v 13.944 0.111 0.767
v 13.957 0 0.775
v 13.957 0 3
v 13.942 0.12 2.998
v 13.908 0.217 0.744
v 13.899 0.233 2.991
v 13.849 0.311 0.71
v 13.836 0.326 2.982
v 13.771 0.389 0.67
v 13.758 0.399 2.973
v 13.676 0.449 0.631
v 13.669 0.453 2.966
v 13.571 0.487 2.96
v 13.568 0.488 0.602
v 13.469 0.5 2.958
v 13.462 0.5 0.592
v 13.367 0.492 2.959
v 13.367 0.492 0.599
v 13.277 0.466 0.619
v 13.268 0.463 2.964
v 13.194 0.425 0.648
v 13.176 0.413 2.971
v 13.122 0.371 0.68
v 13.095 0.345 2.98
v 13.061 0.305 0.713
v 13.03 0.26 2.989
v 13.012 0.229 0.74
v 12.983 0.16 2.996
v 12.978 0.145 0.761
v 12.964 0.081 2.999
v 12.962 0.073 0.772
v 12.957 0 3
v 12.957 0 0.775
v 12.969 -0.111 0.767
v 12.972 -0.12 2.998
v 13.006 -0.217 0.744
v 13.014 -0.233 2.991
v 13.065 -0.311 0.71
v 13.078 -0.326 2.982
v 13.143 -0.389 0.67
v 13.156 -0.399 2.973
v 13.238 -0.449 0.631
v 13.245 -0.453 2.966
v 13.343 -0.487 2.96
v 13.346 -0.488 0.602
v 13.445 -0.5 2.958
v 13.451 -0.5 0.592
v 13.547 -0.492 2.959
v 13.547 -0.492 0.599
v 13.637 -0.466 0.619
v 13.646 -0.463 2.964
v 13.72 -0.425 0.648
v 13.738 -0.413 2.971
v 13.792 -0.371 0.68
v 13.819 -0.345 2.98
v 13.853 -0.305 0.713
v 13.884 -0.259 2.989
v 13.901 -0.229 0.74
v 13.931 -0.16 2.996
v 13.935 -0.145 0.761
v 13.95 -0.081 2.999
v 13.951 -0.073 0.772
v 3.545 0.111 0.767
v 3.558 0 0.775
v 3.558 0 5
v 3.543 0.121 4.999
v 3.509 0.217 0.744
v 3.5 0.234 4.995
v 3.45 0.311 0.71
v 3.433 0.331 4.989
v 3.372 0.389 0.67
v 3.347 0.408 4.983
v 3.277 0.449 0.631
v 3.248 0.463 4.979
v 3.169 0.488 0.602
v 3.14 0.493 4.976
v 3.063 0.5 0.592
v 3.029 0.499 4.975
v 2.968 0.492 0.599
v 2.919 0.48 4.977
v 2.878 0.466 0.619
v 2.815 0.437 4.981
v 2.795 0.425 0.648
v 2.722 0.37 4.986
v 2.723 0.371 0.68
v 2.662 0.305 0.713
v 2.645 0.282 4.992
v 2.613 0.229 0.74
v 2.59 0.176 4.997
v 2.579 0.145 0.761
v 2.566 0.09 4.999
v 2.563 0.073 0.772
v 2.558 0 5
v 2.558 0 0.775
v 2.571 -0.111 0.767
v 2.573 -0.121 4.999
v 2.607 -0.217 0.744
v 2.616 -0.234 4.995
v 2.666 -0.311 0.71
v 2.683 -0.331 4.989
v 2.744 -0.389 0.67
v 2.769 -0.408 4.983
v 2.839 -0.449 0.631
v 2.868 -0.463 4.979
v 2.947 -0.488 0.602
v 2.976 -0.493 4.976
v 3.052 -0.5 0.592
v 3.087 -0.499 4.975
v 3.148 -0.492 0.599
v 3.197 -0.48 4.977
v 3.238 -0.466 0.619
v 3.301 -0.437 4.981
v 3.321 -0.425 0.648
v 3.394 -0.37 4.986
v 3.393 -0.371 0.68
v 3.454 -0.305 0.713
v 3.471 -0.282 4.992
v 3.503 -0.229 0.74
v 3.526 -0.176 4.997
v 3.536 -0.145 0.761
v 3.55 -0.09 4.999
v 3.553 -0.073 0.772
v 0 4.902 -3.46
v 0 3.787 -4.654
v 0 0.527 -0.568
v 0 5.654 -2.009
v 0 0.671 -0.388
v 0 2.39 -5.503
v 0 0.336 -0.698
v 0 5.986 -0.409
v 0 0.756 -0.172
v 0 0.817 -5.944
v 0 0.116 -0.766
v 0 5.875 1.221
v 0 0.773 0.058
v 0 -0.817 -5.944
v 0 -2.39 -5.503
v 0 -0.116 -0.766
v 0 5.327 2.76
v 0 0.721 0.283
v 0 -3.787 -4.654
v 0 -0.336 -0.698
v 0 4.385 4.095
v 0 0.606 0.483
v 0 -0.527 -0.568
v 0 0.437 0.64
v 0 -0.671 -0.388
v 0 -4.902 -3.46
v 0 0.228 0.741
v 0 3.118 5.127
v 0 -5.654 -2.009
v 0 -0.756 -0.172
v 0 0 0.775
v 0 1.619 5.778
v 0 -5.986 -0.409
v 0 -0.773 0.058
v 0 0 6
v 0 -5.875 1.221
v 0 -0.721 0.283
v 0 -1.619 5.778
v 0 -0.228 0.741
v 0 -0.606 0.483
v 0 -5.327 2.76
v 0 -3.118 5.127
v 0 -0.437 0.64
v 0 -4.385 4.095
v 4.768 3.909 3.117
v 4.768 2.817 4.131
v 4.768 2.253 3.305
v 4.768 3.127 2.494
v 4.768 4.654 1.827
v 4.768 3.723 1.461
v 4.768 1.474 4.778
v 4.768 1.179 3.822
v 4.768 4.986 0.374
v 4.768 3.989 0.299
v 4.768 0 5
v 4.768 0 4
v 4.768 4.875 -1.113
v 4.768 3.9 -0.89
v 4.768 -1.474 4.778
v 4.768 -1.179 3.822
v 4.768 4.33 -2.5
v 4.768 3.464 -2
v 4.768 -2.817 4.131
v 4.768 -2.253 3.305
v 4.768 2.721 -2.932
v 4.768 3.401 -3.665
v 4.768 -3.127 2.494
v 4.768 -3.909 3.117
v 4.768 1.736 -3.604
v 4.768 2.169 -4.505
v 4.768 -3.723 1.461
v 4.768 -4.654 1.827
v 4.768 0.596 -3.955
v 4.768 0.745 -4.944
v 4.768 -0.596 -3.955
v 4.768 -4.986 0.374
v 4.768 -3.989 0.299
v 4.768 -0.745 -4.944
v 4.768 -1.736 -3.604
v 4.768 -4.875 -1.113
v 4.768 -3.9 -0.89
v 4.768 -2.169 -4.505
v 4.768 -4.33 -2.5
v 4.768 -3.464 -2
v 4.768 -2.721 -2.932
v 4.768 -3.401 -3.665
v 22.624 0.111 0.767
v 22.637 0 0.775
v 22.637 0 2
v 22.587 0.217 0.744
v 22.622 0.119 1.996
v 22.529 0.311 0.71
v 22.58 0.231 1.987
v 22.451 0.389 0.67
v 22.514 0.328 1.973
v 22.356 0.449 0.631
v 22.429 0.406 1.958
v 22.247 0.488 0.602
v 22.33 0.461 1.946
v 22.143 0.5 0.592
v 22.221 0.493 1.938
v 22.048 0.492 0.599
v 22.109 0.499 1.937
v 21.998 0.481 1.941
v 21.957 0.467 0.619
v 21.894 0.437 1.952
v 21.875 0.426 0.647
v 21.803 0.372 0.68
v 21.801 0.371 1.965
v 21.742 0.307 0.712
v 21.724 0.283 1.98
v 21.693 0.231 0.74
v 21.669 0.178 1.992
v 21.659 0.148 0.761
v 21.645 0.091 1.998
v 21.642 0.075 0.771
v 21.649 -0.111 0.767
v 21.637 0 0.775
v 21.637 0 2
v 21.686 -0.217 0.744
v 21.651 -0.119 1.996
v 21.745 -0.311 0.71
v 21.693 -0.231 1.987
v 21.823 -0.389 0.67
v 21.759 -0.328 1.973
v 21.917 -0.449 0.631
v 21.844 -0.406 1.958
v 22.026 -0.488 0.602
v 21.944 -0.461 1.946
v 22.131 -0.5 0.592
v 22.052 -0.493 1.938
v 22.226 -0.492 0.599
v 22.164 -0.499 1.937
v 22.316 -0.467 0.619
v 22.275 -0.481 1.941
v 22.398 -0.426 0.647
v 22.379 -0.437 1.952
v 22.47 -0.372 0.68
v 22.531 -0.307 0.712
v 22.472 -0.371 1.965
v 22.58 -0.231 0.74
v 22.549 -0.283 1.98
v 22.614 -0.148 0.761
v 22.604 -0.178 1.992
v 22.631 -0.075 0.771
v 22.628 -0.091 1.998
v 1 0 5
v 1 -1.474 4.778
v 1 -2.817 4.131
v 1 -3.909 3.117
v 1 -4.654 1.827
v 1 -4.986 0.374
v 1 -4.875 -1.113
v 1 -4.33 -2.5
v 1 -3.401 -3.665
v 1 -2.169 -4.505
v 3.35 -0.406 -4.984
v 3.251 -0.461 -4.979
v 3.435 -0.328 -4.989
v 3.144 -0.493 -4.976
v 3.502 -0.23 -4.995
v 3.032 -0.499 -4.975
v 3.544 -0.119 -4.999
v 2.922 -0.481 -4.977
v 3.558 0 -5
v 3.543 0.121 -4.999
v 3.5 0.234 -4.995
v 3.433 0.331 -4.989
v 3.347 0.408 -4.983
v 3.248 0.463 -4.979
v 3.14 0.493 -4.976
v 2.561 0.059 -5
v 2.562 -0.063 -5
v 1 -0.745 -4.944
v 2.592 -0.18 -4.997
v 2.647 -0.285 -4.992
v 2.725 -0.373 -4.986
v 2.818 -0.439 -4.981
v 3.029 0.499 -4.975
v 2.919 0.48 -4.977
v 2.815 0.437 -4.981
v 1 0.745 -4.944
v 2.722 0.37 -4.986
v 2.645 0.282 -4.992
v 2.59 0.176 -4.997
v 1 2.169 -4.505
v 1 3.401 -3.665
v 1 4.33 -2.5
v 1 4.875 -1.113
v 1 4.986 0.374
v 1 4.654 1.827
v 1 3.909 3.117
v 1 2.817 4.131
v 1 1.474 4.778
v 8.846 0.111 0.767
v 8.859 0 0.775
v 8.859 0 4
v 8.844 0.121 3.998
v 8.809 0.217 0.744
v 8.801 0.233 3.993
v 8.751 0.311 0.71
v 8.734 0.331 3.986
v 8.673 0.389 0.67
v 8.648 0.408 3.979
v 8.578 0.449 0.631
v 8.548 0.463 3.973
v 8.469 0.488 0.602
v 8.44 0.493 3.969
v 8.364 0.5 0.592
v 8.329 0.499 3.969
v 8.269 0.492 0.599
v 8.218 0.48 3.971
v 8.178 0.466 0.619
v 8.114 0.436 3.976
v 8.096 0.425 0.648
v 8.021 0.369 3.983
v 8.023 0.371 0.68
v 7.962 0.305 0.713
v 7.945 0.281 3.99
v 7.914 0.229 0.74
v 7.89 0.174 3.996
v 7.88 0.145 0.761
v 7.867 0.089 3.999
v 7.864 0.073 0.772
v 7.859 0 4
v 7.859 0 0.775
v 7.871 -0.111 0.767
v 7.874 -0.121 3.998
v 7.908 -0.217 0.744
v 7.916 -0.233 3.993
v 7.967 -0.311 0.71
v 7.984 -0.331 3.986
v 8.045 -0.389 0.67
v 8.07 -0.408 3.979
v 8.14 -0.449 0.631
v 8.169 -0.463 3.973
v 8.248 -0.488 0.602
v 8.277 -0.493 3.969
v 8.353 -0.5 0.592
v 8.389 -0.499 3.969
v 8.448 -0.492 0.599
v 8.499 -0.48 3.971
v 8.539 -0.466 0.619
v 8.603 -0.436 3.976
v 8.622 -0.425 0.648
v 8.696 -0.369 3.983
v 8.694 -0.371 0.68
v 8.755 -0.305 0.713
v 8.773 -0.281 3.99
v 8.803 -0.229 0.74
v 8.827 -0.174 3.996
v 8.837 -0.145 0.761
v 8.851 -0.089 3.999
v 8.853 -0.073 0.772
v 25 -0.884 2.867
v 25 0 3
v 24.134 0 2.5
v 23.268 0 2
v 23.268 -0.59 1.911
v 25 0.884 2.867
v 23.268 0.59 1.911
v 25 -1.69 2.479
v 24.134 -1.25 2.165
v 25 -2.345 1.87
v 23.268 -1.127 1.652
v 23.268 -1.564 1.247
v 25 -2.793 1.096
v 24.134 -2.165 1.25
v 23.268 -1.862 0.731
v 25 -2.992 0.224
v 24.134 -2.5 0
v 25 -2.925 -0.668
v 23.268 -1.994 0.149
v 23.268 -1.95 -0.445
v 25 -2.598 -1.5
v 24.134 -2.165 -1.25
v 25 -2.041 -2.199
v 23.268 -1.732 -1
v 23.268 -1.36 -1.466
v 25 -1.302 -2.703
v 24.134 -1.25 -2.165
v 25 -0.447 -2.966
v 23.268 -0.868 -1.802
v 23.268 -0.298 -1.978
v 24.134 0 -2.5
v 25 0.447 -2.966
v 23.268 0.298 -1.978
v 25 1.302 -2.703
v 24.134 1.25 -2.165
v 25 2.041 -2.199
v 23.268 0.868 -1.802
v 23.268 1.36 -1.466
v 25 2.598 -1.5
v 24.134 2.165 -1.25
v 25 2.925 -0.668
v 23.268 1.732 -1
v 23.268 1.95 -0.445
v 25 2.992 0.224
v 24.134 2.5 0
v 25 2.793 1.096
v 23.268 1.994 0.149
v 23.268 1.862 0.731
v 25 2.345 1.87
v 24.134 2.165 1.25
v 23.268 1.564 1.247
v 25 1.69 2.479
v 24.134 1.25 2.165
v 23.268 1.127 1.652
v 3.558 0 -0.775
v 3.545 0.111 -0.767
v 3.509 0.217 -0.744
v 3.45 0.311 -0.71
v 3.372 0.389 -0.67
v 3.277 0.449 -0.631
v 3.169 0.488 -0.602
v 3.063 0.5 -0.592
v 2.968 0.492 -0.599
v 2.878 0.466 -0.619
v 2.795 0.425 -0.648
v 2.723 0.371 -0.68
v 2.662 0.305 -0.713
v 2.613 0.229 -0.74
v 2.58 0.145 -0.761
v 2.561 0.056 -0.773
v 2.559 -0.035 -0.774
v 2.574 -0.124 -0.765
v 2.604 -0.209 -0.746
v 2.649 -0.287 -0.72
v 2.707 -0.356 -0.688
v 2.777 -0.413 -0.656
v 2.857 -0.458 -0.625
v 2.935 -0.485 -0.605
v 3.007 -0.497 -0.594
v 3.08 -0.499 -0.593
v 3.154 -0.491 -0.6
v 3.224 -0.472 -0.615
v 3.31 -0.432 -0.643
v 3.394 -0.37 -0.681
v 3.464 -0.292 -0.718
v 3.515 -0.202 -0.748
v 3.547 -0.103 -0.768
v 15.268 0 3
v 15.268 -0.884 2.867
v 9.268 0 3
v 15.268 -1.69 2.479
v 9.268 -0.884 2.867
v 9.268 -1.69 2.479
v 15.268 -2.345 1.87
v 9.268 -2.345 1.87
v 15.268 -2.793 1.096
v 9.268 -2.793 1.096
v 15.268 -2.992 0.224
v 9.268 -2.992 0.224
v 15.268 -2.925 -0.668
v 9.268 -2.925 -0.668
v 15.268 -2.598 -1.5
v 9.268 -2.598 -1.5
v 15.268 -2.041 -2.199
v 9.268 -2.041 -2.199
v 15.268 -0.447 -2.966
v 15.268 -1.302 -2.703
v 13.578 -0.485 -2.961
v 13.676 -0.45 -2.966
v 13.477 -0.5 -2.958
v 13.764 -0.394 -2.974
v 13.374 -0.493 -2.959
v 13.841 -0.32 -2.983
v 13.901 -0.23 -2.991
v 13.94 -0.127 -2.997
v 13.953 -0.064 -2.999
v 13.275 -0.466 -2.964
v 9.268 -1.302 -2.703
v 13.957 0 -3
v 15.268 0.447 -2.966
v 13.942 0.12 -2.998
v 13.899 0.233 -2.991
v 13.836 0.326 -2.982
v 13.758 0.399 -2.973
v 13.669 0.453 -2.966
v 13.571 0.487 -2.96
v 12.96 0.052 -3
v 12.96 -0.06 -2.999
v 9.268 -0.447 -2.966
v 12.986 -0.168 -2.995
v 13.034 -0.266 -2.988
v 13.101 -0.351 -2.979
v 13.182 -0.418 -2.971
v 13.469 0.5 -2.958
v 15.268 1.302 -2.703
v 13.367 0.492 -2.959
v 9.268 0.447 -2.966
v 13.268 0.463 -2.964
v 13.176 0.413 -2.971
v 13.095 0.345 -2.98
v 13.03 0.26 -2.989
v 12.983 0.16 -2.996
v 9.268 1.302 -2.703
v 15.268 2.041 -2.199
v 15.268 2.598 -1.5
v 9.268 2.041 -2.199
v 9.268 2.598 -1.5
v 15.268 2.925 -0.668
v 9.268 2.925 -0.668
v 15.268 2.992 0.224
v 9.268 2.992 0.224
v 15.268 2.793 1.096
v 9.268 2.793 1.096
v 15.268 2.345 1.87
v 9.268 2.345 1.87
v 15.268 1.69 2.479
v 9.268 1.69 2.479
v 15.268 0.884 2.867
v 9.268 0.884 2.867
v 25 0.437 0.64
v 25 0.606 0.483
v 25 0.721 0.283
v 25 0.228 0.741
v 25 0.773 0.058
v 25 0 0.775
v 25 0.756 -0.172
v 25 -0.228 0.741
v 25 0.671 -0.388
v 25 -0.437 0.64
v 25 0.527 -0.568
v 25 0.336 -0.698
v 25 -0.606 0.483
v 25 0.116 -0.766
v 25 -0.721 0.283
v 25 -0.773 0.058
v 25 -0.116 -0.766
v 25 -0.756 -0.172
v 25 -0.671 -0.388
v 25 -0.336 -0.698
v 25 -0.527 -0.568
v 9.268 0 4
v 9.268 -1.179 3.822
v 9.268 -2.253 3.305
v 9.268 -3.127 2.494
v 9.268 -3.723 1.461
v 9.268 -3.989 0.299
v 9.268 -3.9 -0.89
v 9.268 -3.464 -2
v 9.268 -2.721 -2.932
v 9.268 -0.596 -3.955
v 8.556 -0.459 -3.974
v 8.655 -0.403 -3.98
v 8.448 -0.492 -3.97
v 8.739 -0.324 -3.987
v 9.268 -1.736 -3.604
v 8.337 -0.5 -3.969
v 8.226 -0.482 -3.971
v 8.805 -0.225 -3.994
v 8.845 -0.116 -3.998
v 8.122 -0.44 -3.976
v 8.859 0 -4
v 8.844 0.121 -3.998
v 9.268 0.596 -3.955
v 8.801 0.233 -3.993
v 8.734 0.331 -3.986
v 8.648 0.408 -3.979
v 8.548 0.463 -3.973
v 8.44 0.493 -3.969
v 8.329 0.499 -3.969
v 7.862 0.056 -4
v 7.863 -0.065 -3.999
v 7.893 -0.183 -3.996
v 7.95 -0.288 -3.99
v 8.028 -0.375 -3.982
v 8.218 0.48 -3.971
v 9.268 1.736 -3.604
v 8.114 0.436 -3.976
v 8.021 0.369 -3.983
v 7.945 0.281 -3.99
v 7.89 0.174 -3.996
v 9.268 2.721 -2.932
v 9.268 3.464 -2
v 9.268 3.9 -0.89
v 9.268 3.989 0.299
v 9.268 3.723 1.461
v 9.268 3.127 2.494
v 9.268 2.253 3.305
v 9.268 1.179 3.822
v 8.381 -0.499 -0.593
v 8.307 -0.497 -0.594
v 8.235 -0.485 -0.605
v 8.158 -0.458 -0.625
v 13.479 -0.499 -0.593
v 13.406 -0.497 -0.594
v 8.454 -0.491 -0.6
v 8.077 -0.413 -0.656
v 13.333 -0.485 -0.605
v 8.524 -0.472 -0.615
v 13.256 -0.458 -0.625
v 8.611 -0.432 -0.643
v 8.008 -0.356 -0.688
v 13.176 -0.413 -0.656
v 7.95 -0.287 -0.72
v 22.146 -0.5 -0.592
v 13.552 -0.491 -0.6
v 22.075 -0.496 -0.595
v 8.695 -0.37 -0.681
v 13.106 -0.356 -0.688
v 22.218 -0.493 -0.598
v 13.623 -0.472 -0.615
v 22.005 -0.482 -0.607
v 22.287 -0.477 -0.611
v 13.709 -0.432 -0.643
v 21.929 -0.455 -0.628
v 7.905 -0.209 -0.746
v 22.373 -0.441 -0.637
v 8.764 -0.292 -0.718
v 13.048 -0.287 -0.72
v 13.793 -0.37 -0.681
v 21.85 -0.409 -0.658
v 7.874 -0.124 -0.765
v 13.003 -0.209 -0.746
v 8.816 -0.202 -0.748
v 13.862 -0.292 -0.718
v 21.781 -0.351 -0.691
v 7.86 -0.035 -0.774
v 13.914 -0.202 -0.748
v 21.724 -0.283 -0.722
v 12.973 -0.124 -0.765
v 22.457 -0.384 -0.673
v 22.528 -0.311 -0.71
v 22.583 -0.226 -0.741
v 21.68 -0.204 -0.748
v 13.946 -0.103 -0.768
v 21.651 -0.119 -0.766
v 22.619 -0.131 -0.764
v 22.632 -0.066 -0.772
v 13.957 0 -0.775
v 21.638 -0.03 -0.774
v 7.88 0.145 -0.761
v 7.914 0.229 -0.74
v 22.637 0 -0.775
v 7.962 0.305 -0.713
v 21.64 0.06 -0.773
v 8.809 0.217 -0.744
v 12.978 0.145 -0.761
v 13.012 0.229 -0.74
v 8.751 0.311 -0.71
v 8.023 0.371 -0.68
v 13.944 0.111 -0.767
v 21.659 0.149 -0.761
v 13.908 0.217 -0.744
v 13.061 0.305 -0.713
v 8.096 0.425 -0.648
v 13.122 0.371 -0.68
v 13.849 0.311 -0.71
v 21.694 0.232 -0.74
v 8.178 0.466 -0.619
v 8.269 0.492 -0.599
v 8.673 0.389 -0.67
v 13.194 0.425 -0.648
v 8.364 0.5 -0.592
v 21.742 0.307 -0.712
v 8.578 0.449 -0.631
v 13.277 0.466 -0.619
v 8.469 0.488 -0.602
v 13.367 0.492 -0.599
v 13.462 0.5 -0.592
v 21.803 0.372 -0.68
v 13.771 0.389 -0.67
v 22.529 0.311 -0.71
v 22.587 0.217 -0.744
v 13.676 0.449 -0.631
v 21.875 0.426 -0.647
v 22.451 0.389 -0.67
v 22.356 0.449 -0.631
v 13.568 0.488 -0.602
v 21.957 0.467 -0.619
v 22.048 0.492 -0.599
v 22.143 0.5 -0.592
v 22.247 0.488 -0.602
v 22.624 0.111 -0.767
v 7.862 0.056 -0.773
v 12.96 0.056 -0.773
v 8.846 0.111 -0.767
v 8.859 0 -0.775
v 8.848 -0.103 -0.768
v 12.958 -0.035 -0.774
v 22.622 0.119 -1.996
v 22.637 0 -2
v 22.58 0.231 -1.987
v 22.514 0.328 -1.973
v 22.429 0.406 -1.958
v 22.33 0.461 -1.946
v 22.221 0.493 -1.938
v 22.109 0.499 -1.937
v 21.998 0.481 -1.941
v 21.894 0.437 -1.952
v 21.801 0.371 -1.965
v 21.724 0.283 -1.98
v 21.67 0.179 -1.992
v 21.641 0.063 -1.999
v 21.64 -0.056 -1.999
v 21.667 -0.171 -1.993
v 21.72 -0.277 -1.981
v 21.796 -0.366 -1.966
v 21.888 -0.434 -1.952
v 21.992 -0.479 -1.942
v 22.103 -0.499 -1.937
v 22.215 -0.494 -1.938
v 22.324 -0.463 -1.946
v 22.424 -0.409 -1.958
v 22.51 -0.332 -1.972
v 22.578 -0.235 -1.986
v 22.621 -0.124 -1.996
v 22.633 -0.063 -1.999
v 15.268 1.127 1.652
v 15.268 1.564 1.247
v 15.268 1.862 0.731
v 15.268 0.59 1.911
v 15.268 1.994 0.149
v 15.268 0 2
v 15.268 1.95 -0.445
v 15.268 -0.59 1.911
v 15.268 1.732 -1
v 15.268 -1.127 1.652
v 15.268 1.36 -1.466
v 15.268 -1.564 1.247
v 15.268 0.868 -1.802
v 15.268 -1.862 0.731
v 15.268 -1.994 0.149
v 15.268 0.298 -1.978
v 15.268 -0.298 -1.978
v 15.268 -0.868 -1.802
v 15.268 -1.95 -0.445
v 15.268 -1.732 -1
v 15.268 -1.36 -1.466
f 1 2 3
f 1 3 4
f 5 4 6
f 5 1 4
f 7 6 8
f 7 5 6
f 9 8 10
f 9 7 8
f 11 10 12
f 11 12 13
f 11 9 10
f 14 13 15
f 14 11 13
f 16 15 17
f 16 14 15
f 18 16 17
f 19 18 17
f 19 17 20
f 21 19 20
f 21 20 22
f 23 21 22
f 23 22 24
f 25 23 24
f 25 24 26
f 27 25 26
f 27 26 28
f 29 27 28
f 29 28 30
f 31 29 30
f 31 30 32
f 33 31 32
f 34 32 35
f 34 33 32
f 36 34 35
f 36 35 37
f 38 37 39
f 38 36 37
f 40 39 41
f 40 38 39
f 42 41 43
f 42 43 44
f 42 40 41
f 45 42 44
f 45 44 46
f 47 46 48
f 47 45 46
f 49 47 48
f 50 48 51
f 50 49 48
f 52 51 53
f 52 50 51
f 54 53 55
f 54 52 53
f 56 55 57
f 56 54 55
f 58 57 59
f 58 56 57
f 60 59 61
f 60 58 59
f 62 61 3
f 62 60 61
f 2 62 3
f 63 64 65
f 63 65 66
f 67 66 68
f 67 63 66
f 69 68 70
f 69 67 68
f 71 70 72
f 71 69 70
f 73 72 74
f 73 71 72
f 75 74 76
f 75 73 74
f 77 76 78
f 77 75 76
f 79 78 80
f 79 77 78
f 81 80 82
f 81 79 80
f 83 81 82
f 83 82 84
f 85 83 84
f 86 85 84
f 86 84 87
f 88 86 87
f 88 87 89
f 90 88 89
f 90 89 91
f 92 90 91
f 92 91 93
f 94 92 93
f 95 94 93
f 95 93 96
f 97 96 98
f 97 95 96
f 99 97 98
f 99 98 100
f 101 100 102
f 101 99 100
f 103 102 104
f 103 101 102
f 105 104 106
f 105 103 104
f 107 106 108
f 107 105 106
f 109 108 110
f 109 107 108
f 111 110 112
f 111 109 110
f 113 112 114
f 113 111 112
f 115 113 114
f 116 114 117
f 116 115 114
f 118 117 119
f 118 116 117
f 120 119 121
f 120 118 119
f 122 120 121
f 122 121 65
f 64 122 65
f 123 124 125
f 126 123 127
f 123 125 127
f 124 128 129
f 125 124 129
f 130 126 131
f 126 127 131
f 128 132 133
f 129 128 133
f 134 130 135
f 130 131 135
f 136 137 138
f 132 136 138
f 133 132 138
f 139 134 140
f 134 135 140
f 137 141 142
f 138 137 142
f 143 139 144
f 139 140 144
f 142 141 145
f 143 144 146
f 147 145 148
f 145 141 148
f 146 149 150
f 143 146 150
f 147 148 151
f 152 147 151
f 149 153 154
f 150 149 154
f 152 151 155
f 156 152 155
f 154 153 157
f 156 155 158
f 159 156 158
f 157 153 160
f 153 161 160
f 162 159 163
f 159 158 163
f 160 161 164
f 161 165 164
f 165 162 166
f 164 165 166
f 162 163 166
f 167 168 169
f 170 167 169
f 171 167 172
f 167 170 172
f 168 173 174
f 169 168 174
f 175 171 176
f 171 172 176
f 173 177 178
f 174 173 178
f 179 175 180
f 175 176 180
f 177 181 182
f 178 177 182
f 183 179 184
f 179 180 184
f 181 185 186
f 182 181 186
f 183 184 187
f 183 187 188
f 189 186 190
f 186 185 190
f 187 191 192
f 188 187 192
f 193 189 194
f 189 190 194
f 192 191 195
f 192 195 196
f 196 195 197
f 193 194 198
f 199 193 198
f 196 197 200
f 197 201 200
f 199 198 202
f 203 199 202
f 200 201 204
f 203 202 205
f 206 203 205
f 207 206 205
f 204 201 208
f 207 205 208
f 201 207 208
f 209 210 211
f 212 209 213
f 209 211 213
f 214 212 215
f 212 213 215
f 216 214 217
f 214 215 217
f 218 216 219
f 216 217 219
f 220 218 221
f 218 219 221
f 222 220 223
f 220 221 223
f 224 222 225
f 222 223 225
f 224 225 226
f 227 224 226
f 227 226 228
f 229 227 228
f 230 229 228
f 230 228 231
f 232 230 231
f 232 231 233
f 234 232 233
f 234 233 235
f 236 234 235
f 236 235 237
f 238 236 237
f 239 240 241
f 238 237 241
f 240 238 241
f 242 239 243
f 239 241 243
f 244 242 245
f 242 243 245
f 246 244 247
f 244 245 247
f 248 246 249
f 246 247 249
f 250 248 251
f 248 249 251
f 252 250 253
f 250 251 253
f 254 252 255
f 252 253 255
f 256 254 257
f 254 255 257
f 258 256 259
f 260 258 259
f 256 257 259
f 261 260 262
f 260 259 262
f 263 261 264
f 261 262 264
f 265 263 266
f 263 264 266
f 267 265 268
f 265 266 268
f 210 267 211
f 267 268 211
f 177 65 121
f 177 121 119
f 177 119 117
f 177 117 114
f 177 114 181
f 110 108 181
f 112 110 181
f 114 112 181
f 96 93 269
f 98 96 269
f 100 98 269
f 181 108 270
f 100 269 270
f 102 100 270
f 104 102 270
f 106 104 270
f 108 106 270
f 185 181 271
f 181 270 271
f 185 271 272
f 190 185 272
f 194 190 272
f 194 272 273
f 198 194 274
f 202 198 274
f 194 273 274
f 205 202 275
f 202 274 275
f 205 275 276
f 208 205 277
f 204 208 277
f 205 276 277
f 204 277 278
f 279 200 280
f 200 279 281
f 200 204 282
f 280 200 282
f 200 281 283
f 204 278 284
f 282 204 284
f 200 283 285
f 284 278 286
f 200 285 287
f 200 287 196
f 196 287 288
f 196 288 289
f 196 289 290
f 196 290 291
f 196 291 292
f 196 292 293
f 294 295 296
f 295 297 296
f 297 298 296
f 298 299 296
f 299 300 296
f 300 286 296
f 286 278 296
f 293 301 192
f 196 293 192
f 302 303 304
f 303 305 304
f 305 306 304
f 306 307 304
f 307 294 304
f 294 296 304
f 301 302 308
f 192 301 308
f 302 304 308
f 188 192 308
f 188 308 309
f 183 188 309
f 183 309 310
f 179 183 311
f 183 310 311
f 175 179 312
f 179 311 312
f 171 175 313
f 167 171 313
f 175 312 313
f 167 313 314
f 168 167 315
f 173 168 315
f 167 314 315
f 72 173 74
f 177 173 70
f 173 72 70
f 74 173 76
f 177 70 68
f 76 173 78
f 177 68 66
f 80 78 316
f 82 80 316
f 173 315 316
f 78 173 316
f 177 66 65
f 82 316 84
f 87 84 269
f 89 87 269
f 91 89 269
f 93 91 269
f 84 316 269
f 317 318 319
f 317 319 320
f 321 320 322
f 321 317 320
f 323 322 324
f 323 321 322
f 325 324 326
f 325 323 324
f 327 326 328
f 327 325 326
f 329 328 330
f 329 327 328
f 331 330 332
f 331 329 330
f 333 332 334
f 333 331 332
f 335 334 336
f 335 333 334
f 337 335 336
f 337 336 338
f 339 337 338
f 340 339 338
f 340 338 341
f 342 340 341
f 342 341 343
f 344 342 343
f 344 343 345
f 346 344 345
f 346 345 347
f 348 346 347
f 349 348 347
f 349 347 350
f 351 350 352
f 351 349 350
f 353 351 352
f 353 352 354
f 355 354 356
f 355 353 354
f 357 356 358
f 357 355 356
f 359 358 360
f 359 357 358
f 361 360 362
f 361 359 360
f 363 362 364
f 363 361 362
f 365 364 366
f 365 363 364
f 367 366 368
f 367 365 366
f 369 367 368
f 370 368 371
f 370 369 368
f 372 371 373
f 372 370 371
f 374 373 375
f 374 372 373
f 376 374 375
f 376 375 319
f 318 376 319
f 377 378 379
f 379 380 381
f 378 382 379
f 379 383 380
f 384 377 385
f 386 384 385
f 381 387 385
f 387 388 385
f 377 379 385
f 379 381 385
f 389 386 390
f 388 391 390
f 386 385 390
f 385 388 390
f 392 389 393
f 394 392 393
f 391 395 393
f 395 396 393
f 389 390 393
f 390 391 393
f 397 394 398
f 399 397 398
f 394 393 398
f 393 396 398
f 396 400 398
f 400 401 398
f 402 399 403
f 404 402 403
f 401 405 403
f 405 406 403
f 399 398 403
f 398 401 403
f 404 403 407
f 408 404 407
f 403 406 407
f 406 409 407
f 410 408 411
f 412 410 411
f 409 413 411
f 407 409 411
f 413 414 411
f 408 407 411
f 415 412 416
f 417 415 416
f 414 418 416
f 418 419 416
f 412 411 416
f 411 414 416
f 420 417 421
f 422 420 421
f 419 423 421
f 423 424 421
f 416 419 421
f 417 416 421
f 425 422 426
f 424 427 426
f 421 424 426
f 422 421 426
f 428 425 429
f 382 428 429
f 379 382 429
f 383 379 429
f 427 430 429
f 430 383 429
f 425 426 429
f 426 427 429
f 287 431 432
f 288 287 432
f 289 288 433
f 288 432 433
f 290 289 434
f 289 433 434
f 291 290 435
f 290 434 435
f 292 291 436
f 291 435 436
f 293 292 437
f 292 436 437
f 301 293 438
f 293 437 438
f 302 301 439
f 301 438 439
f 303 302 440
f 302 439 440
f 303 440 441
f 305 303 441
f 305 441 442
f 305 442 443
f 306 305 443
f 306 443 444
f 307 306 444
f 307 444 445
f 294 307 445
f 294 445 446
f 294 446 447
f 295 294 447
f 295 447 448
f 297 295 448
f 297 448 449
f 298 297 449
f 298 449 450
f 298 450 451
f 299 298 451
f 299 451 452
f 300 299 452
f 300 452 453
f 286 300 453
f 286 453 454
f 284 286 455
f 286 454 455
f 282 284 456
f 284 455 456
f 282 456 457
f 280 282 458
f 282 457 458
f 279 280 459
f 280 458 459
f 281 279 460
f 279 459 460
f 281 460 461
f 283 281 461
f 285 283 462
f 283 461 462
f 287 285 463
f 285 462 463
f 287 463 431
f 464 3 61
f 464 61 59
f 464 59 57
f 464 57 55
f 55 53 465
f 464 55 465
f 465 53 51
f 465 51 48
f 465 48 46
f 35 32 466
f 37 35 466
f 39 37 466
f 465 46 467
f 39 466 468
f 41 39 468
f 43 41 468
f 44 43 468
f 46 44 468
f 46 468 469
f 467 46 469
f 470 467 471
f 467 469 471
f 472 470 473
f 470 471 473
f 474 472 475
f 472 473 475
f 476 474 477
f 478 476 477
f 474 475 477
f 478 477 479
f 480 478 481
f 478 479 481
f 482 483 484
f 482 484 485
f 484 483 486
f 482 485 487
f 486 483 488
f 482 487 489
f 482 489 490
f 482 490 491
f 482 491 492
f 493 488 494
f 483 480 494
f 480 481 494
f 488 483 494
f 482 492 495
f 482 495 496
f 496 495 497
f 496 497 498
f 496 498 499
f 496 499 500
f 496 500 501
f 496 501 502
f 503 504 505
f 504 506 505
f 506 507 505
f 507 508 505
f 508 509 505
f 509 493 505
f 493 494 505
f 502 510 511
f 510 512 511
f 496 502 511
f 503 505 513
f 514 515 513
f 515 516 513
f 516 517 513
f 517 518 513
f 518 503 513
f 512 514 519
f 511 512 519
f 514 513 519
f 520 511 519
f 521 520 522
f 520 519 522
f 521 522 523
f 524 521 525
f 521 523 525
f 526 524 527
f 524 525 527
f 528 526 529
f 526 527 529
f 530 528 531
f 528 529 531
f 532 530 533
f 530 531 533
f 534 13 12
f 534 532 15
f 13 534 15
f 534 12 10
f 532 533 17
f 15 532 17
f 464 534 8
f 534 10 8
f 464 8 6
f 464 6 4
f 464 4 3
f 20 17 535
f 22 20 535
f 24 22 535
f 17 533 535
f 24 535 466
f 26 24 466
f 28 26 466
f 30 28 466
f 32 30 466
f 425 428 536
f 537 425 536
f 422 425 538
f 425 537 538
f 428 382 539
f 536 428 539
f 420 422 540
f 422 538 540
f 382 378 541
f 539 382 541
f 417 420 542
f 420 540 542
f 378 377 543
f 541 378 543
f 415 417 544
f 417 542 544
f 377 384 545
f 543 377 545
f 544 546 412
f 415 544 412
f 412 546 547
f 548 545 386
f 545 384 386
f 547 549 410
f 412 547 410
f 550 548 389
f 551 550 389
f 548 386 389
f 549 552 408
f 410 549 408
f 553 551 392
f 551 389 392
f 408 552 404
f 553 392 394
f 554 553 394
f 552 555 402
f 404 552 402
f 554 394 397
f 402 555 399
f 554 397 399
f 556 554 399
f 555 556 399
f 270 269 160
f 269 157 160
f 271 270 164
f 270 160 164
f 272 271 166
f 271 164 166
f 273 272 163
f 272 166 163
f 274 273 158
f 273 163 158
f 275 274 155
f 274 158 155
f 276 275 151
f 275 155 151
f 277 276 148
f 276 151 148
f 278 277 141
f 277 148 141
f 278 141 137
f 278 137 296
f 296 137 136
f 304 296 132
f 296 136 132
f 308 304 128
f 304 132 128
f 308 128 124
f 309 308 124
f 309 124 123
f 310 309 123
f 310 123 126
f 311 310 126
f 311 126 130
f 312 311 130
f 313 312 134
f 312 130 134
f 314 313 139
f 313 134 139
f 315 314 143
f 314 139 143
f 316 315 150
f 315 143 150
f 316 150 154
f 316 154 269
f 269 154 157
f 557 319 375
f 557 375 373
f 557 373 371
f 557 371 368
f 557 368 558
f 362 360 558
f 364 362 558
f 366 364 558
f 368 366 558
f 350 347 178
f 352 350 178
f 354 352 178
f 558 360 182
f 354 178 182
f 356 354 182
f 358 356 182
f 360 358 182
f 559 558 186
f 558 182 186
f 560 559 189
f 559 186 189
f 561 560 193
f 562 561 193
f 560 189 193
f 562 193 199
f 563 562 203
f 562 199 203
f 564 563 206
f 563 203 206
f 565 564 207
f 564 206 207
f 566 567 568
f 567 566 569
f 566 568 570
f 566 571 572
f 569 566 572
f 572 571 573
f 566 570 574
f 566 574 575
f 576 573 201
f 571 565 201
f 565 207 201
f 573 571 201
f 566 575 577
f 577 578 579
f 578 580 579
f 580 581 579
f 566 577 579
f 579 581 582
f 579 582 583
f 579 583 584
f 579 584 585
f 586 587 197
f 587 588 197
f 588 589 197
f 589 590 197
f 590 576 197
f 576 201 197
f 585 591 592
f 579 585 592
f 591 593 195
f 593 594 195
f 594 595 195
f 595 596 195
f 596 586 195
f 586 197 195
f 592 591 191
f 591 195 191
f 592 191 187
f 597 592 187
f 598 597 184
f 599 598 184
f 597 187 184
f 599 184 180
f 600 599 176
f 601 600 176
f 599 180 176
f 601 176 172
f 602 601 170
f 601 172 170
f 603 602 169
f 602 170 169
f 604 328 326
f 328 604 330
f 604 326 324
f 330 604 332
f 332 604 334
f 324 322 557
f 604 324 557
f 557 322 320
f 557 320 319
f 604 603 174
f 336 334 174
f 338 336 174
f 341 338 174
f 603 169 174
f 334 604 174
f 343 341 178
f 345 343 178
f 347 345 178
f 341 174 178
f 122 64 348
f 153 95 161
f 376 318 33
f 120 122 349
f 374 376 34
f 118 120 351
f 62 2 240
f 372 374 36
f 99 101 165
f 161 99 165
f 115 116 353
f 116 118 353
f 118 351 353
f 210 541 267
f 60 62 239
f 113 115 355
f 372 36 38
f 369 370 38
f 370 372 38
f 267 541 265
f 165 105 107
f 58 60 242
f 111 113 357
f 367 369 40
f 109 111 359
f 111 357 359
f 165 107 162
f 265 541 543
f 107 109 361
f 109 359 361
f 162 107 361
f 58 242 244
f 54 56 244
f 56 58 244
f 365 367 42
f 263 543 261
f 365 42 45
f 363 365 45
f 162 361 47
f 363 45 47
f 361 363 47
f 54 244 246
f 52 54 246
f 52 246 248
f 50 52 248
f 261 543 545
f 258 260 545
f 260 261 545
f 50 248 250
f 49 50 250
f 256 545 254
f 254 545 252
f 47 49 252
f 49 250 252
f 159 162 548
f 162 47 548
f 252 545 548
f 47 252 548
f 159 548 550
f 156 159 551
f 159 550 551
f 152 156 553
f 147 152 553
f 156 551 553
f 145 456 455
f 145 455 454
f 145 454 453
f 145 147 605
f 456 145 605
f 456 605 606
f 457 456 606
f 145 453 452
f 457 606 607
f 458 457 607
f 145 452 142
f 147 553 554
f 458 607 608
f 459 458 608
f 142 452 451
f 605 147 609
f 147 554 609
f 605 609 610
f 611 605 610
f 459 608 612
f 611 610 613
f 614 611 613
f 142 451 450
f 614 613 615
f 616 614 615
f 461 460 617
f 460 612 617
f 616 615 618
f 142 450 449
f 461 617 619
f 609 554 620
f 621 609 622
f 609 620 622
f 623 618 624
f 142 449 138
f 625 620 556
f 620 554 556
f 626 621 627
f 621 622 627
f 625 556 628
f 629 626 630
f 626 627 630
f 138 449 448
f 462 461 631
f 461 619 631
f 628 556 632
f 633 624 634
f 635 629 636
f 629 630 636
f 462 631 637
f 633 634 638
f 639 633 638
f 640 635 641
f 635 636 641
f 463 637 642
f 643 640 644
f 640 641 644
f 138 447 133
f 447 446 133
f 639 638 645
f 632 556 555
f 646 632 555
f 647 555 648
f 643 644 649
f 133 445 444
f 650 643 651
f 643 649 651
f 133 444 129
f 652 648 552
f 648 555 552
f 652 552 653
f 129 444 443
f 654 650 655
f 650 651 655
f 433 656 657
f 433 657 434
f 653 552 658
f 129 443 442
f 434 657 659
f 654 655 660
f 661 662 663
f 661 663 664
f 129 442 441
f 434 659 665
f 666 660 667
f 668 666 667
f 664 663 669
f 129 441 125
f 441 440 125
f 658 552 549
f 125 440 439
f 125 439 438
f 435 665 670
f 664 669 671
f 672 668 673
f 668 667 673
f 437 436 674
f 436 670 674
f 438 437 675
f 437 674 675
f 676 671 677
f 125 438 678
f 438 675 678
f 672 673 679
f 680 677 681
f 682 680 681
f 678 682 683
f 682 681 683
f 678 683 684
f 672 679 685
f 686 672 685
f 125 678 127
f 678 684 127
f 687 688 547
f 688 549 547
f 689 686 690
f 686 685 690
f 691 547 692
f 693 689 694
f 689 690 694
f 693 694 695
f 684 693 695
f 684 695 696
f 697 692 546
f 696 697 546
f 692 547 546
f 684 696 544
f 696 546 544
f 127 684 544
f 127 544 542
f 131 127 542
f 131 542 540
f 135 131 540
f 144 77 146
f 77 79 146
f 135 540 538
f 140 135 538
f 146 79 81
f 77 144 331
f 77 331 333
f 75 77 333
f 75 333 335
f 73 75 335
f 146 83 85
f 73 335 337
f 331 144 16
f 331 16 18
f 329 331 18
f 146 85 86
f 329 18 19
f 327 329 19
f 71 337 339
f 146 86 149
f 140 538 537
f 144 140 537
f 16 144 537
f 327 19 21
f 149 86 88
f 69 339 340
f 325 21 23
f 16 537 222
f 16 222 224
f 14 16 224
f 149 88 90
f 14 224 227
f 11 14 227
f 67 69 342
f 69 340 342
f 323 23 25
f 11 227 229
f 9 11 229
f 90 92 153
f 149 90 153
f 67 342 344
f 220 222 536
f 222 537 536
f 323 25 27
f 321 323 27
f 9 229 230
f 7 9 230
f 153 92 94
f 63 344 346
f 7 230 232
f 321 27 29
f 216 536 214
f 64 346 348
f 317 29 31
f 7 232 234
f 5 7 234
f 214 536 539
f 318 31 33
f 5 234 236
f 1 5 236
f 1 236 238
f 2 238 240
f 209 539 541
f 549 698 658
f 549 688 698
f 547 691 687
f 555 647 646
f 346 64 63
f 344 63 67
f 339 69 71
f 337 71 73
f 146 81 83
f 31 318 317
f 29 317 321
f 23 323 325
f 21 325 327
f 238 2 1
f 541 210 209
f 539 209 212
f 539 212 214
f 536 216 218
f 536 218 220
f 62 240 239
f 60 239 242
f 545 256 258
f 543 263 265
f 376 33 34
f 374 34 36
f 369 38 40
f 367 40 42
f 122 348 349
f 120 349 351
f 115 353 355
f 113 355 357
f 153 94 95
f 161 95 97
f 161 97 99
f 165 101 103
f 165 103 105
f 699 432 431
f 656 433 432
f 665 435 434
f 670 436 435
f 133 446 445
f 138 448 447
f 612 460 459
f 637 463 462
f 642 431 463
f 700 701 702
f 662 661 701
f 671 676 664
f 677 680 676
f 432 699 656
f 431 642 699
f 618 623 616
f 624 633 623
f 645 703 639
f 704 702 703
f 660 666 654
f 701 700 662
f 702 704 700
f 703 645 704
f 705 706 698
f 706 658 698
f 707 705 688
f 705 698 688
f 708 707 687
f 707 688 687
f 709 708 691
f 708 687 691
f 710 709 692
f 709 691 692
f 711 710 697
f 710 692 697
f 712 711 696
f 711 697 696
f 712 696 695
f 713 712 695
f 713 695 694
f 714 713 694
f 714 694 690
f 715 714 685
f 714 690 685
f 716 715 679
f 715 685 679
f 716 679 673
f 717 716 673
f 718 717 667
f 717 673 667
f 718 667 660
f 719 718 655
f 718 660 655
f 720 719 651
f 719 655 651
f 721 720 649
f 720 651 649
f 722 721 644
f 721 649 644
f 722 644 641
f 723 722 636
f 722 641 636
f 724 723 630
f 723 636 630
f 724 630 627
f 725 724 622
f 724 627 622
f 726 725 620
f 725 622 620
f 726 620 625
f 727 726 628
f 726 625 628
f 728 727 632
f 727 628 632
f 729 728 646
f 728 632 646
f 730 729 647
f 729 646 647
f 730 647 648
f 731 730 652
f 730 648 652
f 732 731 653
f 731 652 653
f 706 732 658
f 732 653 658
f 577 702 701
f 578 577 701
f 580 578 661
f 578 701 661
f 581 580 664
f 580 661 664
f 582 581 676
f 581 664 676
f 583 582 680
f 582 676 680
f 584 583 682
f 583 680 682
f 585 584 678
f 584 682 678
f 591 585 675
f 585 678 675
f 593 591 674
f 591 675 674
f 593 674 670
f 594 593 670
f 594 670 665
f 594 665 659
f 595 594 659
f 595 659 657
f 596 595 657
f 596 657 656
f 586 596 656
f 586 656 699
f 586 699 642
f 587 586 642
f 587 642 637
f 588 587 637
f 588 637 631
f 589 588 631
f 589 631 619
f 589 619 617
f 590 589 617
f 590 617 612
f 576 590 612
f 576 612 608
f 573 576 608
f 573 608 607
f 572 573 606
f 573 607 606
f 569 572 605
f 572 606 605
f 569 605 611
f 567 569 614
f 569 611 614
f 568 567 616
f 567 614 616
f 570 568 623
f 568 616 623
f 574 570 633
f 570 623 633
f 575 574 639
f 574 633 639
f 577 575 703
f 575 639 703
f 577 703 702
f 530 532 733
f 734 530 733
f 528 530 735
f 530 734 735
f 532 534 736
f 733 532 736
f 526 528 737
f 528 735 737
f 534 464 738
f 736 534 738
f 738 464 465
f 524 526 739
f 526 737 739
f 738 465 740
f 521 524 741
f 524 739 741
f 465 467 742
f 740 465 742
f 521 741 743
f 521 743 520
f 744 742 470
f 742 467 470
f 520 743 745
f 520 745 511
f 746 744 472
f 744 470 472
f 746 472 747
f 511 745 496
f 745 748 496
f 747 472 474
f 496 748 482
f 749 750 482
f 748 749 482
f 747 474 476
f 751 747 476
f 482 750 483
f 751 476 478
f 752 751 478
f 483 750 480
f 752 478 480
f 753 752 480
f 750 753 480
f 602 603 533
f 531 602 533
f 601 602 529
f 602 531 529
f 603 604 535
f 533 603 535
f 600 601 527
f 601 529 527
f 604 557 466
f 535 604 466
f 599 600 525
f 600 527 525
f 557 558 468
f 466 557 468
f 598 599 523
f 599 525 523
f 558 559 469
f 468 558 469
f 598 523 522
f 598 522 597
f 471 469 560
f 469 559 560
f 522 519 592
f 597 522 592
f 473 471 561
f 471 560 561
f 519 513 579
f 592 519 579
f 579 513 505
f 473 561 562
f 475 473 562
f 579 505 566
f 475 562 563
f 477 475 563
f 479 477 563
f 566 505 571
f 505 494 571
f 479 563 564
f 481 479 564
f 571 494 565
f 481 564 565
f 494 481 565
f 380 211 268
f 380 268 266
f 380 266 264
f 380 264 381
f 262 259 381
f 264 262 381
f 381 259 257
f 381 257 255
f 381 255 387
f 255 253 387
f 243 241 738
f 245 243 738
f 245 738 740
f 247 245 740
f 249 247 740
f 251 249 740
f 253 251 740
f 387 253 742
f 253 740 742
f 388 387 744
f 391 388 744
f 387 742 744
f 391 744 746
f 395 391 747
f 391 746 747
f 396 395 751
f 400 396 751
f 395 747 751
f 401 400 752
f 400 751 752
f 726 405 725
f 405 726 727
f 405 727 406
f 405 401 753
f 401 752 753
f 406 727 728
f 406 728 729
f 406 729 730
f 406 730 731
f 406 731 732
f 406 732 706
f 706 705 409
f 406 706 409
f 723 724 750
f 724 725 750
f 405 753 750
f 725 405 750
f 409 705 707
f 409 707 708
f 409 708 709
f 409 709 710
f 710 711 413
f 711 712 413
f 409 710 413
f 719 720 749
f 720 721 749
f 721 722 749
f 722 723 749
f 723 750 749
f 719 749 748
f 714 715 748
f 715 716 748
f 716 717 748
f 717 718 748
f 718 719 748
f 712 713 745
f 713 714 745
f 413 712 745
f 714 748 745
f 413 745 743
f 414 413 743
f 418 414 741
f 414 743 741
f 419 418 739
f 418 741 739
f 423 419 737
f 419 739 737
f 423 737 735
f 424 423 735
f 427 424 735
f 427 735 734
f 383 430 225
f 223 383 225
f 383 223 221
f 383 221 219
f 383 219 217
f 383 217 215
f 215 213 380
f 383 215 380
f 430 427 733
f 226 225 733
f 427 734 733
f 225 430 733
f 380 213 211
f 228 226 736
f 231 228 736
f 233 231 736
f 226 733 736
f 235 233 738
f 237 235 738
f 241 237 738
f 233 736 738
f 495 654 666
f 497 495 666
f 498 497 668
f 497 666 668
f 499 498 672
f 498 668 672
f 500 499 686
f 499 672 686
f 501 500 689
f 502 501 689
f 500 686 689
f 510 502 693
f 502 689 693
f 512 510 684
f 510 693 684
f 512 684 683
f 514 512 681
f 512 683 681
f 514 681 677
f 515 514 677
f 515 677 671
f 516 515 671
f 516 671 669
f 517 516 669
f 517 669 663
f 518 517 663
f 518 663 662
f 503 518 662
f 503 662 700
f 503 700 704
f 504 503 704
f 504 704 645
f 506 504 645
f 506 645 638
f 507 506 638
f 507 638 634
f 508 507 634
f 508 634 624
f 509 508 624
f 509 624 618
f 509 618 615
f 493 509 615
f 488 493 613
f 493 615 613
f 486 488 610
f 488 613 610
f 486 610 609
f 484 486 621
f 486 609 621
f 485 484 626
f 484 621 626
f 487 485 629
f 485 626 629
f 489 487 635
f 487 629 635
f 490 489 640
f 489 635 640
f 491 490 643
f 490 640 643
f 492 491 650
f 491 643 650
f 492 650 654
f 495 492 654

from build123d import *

# Parameters (mm, degrees)
F2_R     = 0.5
F3_DEPTH = 12.5


with BuildPart() as f1:
    # F0 (on Front) → F1 (revolve)
    with BuildSketch(Plane.XZ):
        Polygon((1, 5), (0, 6), (0, 0.775), (25, 0.775), (25, 3), (23.267949, 2), (15.267949, 2), (15.267949, 3), (9.267949, 3), (9.267949, 4), (4.767949, 4), (4.767949, 5), align=None)
    revolve(axis=Axis((6.044726, 0, 0), (1, 0, 0)))

    # F2 (on Top) → F3 (cut, symmetric)
    with BuildSketch(Plane.XY):
        with Locations((3.057949, 0)):
            Circle(F2_R)
        with Locations((8.358715, 0)):
            Circle(F2_R)
        with Locations((13.456892, 0)):
            Circle(F2_R)
        with Locations((22.136655, 0)):
            Circle(F2_R)
    extrude(amount=F3_DEPTH, both=True, mode=Mode.SUBTRACT)


solid = f1.part
